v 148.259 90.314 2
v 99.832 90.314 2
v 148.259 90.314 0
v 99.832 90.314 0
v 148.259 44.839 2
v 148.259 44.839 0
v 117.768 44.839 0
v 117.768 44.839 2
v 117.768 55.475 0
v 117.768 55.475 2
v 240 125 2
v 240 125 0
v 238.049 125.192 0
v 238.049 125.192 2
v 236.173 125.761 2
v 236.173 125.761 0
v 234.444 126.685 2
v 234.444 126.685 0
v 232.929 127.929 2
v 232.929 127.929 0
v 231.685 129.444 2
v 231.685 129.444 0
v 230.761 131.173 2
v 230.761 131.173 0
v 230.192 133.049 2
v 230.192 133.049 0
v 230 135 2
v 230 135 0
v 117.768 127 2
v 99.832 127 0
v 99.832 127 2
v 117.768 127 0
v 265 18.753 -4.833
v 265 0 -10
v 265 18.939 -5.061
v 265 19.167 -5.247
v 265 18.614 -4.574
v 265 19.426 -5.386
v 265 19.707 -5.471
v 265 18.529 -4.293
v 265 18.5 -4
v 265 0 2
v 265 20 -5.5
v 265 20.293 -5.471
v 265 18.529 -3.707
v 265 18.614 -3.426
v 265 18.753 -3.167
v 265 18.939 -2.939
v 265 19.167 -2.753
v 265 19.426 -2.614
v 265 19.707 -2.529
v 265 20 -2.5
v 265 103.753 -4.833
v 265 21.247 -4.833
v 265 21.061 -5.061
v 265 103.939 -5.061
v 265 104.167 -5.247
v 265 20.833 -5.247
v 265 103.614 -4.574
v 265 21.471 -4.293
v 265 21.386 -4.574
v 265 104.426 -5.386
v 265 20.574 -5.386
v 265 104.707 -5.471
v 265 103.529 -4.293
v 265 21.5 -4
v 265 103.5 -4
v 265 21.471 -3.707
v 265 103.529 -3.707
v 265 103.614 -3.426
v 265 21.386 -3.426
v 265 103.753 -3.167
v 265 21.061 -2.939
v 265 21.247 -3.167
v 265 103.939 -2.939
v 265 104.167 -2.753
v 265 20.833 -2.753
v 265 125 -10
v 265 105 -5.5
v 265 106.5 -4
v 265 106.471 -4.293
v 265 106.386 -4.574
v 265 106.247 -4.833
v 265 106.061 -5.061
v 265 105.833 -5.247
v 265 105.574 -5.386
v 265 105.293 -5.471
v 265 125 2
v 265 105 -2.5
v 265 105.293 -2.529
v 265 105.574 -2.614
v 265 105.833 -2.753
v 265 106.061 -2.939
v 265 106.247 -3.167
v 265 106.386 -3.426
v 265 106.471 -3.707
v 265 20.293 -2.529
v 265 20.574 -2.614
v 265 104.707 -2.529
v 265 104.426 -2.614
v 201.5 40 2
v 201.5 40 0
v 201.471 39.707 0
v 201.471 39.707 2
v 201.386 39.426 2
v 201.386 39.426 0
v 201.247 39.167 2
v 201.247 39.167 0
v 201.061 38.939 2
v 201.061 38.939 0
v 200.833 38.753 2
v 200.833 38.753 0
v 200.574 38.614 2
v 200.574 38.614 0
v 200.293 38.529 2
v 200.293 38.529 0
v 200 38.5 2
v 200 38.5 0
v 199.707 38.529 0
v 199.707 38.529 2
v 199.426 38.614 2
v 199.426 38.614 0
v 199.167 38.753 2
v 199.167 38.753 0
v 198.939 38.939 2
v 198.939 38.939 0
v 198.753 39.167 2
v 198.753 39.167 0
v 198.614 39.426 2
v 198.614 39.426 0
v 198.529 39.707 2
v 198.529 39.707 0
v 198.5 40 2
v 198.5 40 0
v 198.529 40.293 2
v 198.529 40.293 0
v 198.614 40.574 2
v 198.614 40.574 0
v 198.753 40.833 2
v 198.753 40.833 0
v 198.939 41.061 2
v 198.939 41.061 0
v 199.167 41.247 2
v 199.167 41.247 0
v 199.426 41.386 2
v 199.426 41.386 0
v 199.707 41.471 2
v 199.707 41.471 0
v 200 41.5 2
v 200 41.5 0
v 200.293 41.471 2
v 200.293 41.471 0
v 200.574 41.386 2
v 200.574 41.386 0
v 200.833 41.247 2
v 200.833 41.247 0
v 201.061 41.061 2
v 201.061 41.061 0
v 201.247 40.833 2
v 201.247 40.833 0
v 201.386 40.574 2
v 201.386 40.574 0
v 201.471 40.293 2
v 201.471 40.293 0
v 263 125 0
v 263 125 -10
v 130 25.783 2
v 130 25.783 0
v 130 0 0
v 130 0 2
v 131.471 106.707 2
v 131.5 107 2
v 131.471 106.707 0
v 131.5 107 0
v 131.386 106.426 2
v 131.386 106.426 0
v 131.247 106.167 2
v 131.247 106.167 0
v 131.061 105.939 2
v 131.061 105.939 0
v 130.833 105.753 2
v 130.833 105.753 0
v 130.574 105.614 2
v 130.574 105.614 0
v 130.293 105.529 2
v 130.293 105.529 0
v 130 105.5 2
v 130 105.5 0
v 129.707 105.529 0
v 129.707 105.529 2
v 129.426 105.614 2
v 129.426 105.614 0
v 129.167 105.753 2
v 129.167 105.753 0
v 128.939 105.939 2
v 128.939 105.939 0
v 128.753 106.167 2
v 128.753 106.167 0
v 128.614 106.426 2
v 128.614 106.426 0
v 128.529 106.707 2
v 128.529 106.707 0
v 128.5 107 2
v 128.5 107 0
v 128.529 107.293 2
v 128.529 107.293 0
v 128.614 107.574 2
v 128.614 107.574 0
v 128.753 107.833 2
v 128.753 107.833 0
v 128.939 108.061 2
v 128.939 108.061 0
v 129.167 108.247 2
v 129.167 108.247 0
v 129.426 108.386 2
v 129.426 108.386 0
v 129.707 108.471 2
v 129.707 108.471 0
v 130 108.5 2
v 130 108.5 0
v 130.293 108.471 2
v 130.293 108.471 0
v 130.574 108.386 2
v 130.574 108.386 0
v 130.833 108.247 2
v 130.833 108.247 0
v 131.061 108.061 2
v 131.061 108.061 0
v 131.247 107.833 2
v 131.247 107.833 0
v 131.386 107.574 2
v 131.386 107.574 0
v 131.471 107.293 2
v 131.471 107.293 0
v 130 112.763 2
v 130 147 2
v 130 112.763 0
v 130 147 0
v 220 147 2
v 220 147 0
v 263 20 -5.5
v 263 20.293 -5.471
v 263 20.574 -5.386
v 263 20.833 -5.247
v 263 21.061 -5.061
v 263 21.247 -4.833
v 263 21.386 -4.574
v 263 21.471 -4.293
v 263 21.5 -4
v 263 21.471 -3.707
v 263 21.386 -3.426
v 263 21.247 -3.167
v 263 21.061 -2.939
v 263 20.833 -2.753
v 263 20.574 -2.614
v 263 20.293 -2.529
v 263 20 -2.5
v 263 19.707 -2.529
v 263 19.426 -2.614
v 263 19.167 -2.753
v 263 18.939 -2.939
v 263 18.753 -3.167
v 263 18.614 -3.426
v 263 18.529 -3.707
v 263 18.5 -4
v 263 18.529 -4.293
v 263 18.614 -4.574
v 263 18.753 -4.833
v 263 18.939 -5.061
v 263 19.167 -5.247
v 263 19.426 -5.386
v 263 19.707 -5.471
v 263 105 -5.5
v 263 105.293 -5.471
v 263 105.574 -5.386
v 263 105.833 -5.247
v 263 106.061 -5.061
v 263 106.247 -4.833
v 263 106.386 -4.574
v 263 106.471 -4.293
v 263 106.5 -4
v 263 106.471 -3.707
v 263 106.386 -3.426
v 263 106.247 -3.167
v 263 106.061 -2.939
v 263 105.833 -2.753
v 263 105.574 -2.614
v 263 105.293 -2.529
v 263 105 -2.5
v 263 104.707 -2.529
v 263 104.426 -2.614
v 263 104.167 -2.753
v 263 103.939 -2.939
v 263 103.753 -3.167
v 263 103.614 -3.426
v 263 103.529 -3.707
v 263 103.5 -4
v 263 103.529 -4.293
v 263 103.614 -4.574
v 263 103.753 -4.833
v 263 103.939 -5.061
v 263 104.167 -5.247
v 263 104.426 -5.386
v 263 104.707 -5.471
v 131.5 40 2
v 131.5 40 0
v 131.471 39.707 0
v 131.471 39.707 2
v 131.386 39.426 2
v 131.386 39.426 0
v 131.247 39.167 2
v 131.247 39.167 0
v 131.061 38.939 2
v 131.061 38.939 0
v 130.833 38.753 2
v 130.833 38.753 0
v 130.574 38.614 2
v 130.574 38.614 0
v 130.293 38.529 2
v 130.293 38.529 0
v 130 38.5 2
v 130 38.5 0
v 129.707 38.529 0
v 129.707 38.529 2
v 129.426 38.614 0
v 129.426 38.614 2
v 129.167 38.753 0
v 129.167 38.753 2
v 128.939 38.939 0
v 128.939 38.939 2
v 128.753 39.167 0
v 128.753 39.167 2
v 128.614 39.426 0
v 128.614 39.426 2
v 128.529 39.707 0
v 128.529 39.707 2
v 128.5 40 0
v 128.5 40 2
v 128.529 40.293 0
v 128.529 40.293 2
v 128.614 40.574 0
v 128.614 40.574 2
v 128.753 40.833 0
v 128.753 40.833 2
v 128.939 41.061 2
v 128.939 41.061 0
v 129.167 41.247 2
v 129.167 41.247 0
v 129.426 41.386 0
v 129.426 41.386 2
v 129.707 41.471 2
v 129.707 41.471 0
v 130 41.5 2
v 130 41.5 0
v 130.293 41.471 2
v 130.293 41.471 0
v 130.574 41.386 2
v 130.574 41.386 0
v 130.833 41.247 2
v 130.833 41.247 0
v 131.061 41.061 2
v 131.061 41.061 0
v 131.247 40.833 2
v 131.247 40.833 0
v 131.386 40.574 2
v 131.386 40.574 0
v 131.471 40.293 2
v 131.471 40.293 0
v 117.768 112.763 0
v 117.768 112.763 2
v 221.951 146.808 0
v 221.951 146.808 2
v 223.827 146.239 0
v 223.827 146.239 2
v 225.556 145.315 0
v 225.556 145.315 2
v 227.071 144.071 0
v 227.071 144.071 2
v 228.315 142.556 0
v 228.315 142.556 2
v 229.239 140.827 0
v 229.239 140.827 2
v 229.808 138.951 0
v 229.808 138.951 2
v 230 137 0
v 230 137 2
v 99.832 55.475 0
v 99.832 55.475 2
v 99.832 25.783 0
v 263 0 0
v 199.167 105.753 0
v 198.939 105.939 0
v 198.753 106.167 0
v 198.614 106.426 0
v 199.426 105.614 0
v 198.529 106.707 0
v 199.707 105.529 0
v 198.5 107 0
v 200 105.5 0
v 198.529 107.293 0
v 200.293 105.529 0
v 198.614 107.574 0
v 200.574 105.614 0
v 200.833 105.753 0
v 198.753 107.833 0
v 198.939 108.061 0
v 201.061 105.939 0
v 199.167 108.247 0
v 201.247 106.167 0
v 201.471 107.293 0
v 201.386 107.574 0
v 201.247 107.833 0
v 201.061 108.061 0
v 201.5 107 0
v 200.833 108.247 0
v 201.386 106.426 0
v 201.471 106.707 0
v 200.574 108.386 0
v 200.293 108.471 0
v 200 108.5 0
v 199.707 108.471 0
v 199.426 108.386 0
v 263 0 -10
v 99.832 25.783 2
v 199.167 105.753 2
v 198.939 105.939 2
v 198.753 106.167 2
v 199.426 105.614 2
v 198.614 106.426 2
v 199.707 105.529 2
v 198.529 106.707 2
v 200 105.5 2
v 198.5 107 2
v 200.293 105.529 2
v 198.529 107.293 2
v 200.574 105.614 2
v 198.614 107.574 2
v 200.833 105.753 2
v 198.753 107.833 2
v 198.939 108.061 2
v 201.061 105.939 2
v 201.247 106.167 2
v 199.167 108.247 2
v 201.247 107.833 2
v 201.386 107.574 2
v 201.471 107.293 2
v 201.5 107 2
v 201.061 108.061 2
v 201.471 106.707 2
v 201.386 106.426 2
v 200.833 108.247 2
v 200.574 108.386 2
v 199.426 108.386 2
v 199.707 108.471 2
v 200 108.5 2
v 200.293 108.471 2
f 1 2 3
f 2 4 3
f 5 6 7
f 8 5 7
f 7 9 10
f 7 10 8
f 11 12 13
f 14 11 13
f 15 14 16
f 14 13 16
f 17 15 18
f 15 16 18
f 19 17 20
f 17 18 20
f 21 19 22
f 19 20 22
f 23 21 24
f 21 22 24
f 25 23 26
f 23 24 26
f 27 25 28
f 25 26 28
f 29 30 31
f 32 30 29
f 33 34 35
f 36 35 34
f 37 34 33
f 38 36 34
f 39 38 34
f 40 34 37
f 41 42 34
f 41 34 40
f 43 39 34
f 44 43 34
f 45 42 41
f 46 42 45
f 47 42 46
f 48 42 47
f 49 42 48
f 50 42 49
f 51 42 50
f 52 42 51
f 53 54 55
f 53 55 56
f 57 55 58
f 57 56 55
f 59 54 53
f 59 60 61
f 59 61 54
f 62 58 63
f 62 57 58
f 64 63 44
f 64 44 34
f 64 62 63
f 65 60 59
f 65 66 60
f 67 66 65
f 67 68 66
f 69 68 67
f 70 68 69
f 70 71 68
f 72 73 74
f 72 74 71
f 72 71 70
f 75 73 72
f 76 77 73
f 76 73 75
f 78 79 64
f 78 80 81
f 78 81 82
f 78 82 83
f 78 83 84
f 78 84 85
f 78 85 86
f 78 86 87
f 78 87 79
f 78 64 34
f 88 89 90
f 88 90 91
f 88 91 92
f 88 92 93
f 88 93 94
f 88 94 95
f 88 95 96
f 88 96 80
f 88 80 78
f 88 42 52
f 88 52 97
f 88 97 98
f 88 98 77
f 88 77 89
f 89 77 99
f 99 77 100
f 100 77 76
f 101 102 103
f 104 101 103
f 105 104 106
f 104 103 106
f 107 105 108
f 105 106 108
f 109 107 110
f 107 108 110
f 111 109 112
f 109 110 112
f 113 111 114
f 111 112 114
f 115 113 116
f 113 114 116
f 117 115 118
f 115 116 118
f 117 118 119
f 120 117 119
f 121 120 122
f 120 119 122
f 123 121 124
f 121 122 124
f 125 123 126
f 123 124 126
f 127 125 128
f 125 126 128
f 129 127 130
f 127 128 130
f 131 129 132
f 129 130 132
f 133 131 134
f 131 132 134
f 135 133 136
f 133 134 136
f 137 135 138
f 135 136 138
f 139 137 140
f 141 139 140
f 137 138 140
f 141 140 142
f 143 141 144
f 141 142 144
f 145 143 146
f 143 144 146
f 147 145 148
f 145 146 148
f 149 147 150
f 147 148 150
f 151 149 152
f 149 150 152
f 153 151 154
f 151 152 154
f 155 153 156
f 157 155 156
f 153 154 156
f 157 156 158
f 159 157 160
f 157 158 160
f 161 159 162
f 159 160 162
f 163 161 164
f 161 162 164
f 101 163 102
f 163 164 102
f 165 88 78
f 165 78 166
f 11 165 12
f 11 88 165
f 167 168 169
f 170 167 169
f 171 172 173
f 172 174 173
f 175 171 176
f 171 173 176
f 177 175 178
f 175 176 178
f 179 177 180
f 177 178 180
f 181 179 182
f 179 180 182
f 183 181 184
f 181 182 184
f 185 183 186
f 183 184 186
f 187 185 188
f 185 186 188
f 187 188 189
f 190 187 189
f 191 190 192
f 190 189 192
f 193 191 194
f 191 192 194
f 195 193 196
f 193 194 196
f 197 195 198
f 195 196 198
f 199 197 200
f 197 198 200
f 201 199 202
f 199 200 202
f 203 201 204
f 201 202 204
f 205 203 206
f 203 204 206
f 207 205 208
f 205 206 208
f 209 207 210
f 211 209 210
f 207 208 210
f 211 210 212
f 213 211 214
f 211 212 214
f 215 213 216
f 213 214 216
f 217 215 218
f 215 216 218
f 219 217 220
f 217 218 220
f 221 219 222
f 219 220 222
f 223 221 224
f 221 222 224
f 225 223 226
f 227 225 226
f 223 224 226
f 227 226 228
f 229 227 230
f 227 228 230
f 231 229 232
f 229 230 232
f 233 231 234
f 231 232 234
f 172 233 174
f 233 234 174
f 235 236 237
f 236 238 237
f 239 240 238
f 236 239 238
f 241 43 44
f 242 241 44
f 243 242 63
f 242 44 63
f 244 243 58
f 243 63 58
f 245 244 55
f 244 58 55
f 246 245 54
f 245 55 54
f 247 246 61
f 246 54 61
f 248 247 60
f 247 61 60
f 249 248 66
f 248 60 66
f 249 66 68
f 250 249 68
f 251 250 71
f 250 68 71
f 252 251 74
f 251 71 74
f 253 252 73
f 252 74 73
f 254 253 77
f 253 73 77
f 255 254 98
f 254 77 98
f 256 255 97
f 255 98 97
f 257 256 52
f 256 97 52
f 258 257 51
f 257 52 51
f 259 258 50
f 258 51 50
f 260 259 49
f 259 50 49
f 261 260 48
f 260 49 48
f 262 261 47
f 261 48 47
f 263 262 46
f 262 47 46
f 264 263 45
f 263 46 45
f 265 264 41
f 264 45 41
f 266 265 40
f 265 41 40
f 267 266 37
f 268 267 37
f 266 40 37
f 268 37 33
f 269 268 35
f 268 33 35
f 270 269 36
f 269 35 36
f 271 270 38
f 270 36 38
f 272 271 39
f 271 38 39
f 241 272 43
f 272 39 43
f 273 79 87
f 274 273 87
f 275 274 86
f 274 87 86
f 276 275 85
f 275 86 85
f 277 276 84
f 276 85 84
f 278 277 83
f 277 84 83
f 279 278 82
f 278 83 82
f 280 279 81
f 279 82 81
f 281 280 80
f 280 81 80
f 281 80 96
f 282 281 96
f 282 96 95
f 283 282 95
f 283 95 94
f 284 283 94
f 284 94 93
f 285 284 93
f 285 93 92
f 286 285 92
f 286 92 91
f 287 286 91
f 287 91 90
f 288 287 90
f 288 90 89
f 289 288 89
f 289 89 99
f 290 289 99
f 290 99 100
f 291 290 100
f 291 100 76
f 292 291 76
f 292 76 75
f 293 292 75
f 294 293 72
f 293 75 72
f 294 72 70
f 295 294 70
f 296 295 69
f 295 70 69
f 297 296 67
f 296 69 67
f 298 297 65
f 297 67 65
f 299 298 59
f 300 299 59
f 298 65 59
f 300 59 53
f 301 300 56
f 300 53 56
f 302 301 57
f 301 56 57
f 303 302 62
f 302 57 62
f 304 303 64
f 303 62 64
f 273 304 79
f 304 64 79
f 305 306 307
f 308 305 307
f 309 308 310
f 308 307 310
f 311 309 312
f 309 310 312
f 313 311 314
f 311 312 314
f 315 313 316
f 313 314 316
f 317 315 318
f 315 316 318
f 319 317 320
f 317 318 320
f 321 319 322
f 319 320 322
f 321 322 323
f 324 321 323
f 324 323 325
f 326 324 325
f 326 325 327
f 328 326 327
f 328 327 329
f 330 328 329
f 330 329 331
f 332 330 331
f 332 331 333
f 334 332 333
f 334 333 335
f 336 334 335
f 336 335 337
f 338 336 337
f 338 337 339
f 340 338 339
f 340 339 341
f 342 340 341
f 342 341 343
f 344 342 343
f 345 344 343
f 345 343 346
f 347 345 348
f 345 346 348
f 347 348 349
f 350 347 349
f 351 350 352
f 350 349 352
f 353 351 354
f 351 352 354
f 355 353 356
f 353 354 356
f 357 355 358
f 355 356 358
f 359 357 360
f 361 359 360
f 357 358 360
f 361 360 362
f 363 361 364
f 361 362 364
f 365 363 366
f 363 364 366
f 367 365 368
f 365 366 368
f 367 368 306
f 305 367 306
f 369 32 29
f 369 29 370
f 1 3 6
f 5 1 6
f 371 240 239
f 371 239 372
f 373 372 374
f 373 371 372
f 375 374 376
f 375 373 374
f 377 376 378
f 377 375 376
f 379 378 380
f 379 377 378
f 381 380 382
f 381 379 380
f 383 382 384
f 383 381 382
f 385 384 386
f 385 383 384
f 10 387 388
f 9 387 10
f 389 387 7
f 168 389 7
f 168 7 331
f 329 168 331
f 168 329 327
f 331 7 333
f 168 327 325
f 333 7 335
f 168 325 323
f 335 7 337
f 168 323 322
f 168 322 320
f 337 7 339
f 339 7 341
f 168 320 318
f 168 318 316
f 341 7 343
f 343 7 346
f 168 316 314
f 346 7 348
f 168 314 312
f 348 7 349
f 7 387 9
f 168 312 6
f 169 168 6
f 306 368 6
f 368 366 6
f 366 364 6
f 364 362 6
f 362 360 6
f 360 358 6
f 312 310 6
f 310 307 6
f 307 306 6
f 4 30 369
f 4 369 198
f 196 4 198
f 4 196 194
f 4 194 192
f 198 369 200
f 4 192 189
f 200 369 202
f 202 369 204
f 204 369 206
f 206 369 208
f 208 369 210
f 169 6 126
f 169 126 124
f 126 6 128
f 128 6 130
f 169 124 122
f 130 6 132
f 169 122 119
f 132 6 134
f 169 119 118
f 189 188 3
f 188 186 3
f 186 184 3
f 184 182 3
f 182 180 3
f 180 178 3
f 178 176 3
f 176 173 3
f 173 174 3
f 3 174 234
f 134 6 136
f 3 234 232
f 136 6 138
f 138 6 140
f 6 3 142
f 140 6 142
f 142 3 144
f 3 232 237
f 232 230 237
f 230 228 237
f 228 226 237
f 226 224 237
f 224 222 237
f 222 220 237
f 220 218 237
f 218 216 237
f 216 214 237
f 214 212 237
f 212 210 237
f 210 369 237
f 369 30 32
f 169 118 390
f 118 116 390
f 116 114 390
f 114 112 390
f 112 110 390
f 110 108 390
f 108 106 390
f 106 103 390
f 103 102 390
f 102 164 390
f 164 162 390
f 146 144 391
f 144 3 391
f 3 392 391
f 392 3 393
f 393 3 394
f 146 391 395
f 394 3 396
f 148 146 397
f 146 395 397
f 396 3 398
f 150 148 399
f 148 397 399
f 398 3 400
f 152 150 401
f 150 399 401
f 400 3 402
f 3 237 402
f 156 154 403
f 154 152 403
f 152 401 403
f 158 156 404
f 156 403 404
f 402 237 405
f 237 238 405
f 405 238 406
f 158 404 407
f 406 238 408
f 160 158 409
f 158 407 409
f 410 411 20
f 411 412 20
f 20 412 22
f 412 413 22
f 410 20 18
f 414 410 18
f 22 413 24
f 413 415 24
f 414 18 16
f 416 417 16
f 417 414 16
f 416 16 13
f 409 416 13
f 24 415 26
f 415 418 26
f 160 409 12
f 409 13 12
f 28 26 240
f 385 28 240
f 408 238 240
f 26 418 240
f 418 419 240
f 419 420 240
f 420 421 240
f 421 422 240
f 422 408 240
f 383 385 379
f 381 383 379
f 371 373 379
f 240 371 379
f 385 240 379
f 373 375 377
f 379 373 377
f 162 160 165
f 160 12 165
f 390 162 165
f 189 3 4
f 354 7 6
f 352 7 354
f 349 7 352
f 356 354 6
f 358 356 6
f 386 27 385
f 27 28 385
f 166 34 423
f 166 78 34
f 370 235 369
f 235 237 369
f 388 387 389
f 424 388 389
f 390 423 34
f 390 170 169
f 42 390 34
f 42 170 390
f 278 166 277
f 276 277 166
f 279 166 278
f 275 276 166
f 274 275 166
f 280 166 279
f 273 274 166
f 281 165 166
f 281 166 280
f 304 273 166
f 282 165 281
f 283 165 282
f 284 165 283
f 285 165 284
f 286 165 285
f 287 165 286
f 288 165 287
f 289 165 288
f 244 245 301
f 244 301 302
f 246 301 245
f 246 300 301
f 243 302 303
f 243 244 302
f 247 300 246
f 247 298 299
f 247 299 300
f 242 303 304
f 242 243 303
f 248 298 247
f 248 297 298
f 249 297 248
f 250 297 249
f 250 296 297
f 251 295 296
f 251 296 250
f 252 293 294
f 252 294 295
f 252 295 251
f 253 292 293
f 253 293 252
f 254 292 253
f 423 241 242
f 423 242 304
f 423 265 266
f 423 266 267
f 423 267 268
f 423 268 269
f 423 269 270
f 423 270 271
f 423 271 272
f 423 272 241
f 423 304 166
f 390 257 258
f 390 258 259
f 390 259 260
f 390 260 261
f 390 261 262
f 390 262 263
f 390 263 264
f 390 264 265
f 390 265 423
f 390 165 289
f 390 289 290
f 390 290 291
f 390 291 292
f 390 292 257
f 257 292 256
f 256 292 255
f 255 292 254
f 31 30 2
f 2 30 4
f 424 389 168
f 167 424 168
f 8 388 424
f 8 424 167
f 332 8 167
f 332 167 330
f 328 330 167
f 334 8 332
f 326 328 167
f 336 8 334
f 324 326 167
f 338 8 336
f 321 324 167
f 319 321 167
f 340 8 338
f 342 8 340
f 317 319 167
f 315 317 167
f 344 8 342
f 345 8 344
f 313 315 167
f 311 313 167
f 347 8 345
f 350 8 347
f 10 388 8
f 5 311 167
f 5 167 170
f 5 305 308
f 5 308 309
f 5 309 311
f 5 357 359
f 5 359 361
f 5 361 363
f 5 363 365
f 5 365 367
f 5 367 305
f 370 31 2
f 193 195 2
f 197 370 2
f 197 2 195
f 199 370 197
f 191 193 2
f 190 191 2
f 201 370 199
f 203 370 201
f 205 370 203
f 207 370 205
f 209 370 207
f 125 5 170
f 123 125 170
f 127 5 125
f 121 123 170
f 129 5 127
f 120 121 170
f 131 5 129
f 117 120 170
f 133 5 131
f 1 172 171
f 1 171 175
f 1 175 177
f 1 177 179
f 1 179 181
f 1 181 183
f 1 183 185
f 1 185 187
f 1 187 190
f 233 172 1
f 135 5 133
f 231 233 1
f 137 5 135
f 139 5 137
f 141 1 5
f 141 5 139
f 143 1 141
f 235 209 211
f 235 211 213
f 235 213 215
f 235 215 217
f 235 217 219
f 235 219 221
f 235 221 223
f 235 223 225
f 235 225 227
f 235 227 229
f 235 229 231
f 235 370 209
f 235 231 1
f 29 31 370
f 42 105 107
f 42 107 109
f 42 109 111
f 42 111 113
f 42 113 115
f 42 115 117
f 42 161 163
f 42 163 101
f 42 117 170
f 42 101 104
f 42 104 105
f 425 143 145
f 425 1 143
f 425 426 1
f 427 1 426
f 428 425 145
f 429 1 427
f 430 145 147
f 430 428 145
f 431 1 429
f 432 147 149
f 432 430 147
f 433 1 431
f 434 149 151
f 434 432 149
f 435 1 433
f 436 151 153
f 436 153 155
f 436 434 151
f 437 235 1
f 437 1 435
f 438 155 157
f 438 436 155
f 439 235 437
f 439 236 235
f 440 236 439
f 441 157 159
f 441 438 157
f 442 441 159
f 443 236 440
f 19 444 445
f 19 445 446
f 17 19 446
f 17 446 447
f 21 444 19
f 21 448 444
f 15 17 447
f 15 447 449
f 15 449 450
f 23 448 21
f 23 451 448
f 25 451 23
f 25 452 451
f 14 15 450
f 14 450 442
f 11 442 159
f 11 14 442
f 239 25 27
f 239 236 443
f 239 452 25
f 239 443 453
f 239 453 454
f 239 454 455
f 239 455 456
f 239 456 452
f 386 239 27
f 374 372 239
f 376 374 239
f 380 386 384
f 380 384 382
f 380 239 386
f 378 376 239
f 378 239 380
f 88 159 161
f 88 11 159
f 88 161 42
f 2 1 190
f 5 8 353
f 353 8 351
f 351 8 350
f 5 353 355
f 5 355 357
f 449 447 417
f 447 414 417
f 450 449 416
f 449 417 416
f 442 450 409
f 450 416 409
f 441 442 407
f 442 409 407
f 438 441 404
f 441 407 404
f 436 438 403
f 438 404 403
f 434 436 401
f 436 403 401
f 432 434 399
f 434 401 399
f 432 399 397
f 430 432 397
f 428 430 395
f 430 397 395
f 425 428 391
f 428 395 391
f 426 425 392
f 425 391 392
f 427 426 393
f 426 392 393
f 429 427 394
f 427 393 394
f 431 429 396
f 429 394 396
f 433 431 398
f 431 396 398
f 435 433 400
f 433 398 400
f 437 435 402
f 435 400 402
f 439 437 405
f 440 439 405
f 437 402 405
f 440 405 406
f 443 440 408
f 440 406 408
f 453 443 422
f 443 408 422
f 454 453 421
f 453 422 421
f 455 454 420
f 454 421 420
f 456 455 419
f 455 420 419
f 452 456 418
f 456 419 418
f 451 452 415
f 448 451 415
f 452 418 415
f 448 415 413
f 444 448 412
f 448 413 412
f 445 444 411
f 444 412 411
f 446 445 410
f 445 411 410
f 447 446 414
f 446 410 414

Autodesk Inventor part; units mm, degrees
ref_plane "YZ Plane" through (0, 0, 0) normal (1, 0, 0) x (0, 1, 0)
ref_plane "XZ Plane" through (0, 0, 0) normal (0, 1, 0) x (-1, 0, 0)
ref_plane "XY Plane" through (0, 0, 0) normal (0, 0, 1) x (1, 0, 0)
sketch "Sketch1" plane through (0, 0, 0) normal (0, 0, 1) x (1, 0, 0)
  line L0 (0, 0) -> (260, 0)
  line L1 (260, 0) -> (260, 125)
  line L2 (220, 147) -> (0, 147)
  line L3 (0, 147) -> (0, 0)
  circle A0 centre (240, 135) radius 8
  circle A1 centre (240, 135) radius 10
  line L4 (250, 135) -> (250.202, 135)
  line L5 (230, 135) -> (230, 137)
  arc A2 (230, 137) -> (220, 147) centre (220, 137) ccw
  line L6 (260, 147) -> (260, 147)
  line L7 (250, 135) -> (250, 137)
  line L8 (240, 125) -> (260, 125)
  line L9 (0, 73.5) -> (260, 73.5)
  line L10 (130, 112.7628) -> (117.7684, 112.7628)
  line L11 (99.8322, 119.3312) -> (99.8322, 90.3139)
  line L12 (99.8322, 90.3139) -> (148.259, 90.3139)
  line L13 (148.259, 90.3139) -> (148.259, 44.839)
  line L14 (148.259, 44.839) -> (117.7684, 44.839)
  line L15 (99.8322, 44.839) -> (99.8322, 25.7829)
  line L16 (99.8322, 25.7829) -> (130, 25.7829)
  line L17 (99.8322, 119.3312) -> (99.8322, 127)
  line L18 (99.8322, 127) -> (117.7684, 127)
  line L19 (117.7684, 127) -> (117.7684, 112.7628)
  line L20 (99.8322, 44.839) -> (99.8322, 55.475)
  line L21 (99.8322, 55.475) -> (117.7684, 55.475)
  line L22 (117.7684, 55.475) -> (117.7684, 44.839)
  line L23 (130, 147) -> (130, 112.7628)
  line L24 (130, 25.7829) -> (130, 0)
  line L25 (60, 107) -> (200, 107)
  line L26 (200, 107) -> (200, 40)
  line L27 (200, 40) -> (60, 40)
  line L28 (60, 40) -> (60, 107)
  circle A3 centre (60, 107) radius 1.5
  circle A4 centre (200, 107) radius 1.5
  circle A5 centre (200, 40) radius 1.5
  circle A6 centre (60, 40) radius 1.5
  circle A7 centre (130, 107) radius 1.5
  circle A8 centre (130, 40) radius 1.5
  line L29 (260, 125) -> (265, 125)
  line L30 (265, 125) -> (265, 0)
  line L31 (265, 0) -> (260, 0)
  line L32 (260, 0) -> (260, 125)
  line L33 (265, 0) -> (263, 0)
  line L34 (263, 0) -> (263, 125)
  point P0 (260, 67.5)
  point P1 (200, 73.5)
  point P2 (148.259, 73.5)
  point P3 (99.8322, 107)
  point P4 (128.5, 107)
  point P5 (131.5, 107)
  point P6 (198.5, 107)
  point P7 (200, 105.5)
  dimension "d2" = 16
  dimension "d3" = 20
  dimension "d4" = 135
  dimension "d5" = 2
  dimension "d6" = 260
  dimension "d7" = 147
  dimension "d8" = 10
  dimension "d11" = 22
  dimension "d16" = 40
  dimension "d17" = 40
  dimension "d18" = 60
  dimension "d19" = 60
  dimension "d20" = 3
  dimension "d21" = 3
  dimension "d22" = 3
  dimension "d23" = 3
  dimension "d24" = 140
  dimension "d25" = 67
  dimension "d26" = 3
  dimension "d27" = 3
  dimension "d28" = 70
  dimension "d29" = 70
  dimension "d30" = 5
  dimension "d31" = 2
extrude "Extrusion1" add sketch "Sketch1" along normal blind 2 contours L24 L16 L15 L27 A8 A5 L26 L9 L1 L0 | L1 L29 L34 L31 | L9 L26 A4 L25 A7 L11 L17 L18 L19 L10 L23 L2 A2 L5 A1 L8 L1 | L34 L29 L30 L31 | L13 L12 L11 L25 A7 A4 L26 L9 | L9 L26 A5 L27 A8 L15 L20 L21 L22 L14 L13
sketch "Sketch2" plane through (0, 0, 0) normal (0, 0, -1) x (-1, 0, 0)
  line L0 (-265, 125) -> (-240, 125) projected
  line L1 (-130, 0) -> (-265, 0) projected
  line L2 (-265, 125) -> (-263, 125)
  line L3 (-263, 125) -> (-263, 0)
  line L4 (-263, 0) -> (-265, 0)
  line L5 (-265, 0) -> (-265, 125)
  point P0 (0, 0)
  dimension "d32" = 2
extrude "Extrusion2" add sketch "Sketch2" along normal blind 10
sketch "Sketch3" plane through (265, 0, 2) normal (1, 0, 0) x (0, 0, -1)
  line L0 (12, 125) -> (0, 125) projected
  line L1 (6, 125) -> (6, 0)
  line L2 (12, 0) -> (0, 0) projected
  circle A0 centre (6, 105) radius 1.5
  circle A1 centre (6, 20) radius 1.5
  point P0 (2, 0)
  dimension "d35" = 3
  dimension "d36" = 3
  dimension "d37" = 20
  dimension "d38" = 20
extrude "Extrusion3" cut sketch "Sketch3" against normal blind 10
properties part number "Coffee_Machine_Base"
